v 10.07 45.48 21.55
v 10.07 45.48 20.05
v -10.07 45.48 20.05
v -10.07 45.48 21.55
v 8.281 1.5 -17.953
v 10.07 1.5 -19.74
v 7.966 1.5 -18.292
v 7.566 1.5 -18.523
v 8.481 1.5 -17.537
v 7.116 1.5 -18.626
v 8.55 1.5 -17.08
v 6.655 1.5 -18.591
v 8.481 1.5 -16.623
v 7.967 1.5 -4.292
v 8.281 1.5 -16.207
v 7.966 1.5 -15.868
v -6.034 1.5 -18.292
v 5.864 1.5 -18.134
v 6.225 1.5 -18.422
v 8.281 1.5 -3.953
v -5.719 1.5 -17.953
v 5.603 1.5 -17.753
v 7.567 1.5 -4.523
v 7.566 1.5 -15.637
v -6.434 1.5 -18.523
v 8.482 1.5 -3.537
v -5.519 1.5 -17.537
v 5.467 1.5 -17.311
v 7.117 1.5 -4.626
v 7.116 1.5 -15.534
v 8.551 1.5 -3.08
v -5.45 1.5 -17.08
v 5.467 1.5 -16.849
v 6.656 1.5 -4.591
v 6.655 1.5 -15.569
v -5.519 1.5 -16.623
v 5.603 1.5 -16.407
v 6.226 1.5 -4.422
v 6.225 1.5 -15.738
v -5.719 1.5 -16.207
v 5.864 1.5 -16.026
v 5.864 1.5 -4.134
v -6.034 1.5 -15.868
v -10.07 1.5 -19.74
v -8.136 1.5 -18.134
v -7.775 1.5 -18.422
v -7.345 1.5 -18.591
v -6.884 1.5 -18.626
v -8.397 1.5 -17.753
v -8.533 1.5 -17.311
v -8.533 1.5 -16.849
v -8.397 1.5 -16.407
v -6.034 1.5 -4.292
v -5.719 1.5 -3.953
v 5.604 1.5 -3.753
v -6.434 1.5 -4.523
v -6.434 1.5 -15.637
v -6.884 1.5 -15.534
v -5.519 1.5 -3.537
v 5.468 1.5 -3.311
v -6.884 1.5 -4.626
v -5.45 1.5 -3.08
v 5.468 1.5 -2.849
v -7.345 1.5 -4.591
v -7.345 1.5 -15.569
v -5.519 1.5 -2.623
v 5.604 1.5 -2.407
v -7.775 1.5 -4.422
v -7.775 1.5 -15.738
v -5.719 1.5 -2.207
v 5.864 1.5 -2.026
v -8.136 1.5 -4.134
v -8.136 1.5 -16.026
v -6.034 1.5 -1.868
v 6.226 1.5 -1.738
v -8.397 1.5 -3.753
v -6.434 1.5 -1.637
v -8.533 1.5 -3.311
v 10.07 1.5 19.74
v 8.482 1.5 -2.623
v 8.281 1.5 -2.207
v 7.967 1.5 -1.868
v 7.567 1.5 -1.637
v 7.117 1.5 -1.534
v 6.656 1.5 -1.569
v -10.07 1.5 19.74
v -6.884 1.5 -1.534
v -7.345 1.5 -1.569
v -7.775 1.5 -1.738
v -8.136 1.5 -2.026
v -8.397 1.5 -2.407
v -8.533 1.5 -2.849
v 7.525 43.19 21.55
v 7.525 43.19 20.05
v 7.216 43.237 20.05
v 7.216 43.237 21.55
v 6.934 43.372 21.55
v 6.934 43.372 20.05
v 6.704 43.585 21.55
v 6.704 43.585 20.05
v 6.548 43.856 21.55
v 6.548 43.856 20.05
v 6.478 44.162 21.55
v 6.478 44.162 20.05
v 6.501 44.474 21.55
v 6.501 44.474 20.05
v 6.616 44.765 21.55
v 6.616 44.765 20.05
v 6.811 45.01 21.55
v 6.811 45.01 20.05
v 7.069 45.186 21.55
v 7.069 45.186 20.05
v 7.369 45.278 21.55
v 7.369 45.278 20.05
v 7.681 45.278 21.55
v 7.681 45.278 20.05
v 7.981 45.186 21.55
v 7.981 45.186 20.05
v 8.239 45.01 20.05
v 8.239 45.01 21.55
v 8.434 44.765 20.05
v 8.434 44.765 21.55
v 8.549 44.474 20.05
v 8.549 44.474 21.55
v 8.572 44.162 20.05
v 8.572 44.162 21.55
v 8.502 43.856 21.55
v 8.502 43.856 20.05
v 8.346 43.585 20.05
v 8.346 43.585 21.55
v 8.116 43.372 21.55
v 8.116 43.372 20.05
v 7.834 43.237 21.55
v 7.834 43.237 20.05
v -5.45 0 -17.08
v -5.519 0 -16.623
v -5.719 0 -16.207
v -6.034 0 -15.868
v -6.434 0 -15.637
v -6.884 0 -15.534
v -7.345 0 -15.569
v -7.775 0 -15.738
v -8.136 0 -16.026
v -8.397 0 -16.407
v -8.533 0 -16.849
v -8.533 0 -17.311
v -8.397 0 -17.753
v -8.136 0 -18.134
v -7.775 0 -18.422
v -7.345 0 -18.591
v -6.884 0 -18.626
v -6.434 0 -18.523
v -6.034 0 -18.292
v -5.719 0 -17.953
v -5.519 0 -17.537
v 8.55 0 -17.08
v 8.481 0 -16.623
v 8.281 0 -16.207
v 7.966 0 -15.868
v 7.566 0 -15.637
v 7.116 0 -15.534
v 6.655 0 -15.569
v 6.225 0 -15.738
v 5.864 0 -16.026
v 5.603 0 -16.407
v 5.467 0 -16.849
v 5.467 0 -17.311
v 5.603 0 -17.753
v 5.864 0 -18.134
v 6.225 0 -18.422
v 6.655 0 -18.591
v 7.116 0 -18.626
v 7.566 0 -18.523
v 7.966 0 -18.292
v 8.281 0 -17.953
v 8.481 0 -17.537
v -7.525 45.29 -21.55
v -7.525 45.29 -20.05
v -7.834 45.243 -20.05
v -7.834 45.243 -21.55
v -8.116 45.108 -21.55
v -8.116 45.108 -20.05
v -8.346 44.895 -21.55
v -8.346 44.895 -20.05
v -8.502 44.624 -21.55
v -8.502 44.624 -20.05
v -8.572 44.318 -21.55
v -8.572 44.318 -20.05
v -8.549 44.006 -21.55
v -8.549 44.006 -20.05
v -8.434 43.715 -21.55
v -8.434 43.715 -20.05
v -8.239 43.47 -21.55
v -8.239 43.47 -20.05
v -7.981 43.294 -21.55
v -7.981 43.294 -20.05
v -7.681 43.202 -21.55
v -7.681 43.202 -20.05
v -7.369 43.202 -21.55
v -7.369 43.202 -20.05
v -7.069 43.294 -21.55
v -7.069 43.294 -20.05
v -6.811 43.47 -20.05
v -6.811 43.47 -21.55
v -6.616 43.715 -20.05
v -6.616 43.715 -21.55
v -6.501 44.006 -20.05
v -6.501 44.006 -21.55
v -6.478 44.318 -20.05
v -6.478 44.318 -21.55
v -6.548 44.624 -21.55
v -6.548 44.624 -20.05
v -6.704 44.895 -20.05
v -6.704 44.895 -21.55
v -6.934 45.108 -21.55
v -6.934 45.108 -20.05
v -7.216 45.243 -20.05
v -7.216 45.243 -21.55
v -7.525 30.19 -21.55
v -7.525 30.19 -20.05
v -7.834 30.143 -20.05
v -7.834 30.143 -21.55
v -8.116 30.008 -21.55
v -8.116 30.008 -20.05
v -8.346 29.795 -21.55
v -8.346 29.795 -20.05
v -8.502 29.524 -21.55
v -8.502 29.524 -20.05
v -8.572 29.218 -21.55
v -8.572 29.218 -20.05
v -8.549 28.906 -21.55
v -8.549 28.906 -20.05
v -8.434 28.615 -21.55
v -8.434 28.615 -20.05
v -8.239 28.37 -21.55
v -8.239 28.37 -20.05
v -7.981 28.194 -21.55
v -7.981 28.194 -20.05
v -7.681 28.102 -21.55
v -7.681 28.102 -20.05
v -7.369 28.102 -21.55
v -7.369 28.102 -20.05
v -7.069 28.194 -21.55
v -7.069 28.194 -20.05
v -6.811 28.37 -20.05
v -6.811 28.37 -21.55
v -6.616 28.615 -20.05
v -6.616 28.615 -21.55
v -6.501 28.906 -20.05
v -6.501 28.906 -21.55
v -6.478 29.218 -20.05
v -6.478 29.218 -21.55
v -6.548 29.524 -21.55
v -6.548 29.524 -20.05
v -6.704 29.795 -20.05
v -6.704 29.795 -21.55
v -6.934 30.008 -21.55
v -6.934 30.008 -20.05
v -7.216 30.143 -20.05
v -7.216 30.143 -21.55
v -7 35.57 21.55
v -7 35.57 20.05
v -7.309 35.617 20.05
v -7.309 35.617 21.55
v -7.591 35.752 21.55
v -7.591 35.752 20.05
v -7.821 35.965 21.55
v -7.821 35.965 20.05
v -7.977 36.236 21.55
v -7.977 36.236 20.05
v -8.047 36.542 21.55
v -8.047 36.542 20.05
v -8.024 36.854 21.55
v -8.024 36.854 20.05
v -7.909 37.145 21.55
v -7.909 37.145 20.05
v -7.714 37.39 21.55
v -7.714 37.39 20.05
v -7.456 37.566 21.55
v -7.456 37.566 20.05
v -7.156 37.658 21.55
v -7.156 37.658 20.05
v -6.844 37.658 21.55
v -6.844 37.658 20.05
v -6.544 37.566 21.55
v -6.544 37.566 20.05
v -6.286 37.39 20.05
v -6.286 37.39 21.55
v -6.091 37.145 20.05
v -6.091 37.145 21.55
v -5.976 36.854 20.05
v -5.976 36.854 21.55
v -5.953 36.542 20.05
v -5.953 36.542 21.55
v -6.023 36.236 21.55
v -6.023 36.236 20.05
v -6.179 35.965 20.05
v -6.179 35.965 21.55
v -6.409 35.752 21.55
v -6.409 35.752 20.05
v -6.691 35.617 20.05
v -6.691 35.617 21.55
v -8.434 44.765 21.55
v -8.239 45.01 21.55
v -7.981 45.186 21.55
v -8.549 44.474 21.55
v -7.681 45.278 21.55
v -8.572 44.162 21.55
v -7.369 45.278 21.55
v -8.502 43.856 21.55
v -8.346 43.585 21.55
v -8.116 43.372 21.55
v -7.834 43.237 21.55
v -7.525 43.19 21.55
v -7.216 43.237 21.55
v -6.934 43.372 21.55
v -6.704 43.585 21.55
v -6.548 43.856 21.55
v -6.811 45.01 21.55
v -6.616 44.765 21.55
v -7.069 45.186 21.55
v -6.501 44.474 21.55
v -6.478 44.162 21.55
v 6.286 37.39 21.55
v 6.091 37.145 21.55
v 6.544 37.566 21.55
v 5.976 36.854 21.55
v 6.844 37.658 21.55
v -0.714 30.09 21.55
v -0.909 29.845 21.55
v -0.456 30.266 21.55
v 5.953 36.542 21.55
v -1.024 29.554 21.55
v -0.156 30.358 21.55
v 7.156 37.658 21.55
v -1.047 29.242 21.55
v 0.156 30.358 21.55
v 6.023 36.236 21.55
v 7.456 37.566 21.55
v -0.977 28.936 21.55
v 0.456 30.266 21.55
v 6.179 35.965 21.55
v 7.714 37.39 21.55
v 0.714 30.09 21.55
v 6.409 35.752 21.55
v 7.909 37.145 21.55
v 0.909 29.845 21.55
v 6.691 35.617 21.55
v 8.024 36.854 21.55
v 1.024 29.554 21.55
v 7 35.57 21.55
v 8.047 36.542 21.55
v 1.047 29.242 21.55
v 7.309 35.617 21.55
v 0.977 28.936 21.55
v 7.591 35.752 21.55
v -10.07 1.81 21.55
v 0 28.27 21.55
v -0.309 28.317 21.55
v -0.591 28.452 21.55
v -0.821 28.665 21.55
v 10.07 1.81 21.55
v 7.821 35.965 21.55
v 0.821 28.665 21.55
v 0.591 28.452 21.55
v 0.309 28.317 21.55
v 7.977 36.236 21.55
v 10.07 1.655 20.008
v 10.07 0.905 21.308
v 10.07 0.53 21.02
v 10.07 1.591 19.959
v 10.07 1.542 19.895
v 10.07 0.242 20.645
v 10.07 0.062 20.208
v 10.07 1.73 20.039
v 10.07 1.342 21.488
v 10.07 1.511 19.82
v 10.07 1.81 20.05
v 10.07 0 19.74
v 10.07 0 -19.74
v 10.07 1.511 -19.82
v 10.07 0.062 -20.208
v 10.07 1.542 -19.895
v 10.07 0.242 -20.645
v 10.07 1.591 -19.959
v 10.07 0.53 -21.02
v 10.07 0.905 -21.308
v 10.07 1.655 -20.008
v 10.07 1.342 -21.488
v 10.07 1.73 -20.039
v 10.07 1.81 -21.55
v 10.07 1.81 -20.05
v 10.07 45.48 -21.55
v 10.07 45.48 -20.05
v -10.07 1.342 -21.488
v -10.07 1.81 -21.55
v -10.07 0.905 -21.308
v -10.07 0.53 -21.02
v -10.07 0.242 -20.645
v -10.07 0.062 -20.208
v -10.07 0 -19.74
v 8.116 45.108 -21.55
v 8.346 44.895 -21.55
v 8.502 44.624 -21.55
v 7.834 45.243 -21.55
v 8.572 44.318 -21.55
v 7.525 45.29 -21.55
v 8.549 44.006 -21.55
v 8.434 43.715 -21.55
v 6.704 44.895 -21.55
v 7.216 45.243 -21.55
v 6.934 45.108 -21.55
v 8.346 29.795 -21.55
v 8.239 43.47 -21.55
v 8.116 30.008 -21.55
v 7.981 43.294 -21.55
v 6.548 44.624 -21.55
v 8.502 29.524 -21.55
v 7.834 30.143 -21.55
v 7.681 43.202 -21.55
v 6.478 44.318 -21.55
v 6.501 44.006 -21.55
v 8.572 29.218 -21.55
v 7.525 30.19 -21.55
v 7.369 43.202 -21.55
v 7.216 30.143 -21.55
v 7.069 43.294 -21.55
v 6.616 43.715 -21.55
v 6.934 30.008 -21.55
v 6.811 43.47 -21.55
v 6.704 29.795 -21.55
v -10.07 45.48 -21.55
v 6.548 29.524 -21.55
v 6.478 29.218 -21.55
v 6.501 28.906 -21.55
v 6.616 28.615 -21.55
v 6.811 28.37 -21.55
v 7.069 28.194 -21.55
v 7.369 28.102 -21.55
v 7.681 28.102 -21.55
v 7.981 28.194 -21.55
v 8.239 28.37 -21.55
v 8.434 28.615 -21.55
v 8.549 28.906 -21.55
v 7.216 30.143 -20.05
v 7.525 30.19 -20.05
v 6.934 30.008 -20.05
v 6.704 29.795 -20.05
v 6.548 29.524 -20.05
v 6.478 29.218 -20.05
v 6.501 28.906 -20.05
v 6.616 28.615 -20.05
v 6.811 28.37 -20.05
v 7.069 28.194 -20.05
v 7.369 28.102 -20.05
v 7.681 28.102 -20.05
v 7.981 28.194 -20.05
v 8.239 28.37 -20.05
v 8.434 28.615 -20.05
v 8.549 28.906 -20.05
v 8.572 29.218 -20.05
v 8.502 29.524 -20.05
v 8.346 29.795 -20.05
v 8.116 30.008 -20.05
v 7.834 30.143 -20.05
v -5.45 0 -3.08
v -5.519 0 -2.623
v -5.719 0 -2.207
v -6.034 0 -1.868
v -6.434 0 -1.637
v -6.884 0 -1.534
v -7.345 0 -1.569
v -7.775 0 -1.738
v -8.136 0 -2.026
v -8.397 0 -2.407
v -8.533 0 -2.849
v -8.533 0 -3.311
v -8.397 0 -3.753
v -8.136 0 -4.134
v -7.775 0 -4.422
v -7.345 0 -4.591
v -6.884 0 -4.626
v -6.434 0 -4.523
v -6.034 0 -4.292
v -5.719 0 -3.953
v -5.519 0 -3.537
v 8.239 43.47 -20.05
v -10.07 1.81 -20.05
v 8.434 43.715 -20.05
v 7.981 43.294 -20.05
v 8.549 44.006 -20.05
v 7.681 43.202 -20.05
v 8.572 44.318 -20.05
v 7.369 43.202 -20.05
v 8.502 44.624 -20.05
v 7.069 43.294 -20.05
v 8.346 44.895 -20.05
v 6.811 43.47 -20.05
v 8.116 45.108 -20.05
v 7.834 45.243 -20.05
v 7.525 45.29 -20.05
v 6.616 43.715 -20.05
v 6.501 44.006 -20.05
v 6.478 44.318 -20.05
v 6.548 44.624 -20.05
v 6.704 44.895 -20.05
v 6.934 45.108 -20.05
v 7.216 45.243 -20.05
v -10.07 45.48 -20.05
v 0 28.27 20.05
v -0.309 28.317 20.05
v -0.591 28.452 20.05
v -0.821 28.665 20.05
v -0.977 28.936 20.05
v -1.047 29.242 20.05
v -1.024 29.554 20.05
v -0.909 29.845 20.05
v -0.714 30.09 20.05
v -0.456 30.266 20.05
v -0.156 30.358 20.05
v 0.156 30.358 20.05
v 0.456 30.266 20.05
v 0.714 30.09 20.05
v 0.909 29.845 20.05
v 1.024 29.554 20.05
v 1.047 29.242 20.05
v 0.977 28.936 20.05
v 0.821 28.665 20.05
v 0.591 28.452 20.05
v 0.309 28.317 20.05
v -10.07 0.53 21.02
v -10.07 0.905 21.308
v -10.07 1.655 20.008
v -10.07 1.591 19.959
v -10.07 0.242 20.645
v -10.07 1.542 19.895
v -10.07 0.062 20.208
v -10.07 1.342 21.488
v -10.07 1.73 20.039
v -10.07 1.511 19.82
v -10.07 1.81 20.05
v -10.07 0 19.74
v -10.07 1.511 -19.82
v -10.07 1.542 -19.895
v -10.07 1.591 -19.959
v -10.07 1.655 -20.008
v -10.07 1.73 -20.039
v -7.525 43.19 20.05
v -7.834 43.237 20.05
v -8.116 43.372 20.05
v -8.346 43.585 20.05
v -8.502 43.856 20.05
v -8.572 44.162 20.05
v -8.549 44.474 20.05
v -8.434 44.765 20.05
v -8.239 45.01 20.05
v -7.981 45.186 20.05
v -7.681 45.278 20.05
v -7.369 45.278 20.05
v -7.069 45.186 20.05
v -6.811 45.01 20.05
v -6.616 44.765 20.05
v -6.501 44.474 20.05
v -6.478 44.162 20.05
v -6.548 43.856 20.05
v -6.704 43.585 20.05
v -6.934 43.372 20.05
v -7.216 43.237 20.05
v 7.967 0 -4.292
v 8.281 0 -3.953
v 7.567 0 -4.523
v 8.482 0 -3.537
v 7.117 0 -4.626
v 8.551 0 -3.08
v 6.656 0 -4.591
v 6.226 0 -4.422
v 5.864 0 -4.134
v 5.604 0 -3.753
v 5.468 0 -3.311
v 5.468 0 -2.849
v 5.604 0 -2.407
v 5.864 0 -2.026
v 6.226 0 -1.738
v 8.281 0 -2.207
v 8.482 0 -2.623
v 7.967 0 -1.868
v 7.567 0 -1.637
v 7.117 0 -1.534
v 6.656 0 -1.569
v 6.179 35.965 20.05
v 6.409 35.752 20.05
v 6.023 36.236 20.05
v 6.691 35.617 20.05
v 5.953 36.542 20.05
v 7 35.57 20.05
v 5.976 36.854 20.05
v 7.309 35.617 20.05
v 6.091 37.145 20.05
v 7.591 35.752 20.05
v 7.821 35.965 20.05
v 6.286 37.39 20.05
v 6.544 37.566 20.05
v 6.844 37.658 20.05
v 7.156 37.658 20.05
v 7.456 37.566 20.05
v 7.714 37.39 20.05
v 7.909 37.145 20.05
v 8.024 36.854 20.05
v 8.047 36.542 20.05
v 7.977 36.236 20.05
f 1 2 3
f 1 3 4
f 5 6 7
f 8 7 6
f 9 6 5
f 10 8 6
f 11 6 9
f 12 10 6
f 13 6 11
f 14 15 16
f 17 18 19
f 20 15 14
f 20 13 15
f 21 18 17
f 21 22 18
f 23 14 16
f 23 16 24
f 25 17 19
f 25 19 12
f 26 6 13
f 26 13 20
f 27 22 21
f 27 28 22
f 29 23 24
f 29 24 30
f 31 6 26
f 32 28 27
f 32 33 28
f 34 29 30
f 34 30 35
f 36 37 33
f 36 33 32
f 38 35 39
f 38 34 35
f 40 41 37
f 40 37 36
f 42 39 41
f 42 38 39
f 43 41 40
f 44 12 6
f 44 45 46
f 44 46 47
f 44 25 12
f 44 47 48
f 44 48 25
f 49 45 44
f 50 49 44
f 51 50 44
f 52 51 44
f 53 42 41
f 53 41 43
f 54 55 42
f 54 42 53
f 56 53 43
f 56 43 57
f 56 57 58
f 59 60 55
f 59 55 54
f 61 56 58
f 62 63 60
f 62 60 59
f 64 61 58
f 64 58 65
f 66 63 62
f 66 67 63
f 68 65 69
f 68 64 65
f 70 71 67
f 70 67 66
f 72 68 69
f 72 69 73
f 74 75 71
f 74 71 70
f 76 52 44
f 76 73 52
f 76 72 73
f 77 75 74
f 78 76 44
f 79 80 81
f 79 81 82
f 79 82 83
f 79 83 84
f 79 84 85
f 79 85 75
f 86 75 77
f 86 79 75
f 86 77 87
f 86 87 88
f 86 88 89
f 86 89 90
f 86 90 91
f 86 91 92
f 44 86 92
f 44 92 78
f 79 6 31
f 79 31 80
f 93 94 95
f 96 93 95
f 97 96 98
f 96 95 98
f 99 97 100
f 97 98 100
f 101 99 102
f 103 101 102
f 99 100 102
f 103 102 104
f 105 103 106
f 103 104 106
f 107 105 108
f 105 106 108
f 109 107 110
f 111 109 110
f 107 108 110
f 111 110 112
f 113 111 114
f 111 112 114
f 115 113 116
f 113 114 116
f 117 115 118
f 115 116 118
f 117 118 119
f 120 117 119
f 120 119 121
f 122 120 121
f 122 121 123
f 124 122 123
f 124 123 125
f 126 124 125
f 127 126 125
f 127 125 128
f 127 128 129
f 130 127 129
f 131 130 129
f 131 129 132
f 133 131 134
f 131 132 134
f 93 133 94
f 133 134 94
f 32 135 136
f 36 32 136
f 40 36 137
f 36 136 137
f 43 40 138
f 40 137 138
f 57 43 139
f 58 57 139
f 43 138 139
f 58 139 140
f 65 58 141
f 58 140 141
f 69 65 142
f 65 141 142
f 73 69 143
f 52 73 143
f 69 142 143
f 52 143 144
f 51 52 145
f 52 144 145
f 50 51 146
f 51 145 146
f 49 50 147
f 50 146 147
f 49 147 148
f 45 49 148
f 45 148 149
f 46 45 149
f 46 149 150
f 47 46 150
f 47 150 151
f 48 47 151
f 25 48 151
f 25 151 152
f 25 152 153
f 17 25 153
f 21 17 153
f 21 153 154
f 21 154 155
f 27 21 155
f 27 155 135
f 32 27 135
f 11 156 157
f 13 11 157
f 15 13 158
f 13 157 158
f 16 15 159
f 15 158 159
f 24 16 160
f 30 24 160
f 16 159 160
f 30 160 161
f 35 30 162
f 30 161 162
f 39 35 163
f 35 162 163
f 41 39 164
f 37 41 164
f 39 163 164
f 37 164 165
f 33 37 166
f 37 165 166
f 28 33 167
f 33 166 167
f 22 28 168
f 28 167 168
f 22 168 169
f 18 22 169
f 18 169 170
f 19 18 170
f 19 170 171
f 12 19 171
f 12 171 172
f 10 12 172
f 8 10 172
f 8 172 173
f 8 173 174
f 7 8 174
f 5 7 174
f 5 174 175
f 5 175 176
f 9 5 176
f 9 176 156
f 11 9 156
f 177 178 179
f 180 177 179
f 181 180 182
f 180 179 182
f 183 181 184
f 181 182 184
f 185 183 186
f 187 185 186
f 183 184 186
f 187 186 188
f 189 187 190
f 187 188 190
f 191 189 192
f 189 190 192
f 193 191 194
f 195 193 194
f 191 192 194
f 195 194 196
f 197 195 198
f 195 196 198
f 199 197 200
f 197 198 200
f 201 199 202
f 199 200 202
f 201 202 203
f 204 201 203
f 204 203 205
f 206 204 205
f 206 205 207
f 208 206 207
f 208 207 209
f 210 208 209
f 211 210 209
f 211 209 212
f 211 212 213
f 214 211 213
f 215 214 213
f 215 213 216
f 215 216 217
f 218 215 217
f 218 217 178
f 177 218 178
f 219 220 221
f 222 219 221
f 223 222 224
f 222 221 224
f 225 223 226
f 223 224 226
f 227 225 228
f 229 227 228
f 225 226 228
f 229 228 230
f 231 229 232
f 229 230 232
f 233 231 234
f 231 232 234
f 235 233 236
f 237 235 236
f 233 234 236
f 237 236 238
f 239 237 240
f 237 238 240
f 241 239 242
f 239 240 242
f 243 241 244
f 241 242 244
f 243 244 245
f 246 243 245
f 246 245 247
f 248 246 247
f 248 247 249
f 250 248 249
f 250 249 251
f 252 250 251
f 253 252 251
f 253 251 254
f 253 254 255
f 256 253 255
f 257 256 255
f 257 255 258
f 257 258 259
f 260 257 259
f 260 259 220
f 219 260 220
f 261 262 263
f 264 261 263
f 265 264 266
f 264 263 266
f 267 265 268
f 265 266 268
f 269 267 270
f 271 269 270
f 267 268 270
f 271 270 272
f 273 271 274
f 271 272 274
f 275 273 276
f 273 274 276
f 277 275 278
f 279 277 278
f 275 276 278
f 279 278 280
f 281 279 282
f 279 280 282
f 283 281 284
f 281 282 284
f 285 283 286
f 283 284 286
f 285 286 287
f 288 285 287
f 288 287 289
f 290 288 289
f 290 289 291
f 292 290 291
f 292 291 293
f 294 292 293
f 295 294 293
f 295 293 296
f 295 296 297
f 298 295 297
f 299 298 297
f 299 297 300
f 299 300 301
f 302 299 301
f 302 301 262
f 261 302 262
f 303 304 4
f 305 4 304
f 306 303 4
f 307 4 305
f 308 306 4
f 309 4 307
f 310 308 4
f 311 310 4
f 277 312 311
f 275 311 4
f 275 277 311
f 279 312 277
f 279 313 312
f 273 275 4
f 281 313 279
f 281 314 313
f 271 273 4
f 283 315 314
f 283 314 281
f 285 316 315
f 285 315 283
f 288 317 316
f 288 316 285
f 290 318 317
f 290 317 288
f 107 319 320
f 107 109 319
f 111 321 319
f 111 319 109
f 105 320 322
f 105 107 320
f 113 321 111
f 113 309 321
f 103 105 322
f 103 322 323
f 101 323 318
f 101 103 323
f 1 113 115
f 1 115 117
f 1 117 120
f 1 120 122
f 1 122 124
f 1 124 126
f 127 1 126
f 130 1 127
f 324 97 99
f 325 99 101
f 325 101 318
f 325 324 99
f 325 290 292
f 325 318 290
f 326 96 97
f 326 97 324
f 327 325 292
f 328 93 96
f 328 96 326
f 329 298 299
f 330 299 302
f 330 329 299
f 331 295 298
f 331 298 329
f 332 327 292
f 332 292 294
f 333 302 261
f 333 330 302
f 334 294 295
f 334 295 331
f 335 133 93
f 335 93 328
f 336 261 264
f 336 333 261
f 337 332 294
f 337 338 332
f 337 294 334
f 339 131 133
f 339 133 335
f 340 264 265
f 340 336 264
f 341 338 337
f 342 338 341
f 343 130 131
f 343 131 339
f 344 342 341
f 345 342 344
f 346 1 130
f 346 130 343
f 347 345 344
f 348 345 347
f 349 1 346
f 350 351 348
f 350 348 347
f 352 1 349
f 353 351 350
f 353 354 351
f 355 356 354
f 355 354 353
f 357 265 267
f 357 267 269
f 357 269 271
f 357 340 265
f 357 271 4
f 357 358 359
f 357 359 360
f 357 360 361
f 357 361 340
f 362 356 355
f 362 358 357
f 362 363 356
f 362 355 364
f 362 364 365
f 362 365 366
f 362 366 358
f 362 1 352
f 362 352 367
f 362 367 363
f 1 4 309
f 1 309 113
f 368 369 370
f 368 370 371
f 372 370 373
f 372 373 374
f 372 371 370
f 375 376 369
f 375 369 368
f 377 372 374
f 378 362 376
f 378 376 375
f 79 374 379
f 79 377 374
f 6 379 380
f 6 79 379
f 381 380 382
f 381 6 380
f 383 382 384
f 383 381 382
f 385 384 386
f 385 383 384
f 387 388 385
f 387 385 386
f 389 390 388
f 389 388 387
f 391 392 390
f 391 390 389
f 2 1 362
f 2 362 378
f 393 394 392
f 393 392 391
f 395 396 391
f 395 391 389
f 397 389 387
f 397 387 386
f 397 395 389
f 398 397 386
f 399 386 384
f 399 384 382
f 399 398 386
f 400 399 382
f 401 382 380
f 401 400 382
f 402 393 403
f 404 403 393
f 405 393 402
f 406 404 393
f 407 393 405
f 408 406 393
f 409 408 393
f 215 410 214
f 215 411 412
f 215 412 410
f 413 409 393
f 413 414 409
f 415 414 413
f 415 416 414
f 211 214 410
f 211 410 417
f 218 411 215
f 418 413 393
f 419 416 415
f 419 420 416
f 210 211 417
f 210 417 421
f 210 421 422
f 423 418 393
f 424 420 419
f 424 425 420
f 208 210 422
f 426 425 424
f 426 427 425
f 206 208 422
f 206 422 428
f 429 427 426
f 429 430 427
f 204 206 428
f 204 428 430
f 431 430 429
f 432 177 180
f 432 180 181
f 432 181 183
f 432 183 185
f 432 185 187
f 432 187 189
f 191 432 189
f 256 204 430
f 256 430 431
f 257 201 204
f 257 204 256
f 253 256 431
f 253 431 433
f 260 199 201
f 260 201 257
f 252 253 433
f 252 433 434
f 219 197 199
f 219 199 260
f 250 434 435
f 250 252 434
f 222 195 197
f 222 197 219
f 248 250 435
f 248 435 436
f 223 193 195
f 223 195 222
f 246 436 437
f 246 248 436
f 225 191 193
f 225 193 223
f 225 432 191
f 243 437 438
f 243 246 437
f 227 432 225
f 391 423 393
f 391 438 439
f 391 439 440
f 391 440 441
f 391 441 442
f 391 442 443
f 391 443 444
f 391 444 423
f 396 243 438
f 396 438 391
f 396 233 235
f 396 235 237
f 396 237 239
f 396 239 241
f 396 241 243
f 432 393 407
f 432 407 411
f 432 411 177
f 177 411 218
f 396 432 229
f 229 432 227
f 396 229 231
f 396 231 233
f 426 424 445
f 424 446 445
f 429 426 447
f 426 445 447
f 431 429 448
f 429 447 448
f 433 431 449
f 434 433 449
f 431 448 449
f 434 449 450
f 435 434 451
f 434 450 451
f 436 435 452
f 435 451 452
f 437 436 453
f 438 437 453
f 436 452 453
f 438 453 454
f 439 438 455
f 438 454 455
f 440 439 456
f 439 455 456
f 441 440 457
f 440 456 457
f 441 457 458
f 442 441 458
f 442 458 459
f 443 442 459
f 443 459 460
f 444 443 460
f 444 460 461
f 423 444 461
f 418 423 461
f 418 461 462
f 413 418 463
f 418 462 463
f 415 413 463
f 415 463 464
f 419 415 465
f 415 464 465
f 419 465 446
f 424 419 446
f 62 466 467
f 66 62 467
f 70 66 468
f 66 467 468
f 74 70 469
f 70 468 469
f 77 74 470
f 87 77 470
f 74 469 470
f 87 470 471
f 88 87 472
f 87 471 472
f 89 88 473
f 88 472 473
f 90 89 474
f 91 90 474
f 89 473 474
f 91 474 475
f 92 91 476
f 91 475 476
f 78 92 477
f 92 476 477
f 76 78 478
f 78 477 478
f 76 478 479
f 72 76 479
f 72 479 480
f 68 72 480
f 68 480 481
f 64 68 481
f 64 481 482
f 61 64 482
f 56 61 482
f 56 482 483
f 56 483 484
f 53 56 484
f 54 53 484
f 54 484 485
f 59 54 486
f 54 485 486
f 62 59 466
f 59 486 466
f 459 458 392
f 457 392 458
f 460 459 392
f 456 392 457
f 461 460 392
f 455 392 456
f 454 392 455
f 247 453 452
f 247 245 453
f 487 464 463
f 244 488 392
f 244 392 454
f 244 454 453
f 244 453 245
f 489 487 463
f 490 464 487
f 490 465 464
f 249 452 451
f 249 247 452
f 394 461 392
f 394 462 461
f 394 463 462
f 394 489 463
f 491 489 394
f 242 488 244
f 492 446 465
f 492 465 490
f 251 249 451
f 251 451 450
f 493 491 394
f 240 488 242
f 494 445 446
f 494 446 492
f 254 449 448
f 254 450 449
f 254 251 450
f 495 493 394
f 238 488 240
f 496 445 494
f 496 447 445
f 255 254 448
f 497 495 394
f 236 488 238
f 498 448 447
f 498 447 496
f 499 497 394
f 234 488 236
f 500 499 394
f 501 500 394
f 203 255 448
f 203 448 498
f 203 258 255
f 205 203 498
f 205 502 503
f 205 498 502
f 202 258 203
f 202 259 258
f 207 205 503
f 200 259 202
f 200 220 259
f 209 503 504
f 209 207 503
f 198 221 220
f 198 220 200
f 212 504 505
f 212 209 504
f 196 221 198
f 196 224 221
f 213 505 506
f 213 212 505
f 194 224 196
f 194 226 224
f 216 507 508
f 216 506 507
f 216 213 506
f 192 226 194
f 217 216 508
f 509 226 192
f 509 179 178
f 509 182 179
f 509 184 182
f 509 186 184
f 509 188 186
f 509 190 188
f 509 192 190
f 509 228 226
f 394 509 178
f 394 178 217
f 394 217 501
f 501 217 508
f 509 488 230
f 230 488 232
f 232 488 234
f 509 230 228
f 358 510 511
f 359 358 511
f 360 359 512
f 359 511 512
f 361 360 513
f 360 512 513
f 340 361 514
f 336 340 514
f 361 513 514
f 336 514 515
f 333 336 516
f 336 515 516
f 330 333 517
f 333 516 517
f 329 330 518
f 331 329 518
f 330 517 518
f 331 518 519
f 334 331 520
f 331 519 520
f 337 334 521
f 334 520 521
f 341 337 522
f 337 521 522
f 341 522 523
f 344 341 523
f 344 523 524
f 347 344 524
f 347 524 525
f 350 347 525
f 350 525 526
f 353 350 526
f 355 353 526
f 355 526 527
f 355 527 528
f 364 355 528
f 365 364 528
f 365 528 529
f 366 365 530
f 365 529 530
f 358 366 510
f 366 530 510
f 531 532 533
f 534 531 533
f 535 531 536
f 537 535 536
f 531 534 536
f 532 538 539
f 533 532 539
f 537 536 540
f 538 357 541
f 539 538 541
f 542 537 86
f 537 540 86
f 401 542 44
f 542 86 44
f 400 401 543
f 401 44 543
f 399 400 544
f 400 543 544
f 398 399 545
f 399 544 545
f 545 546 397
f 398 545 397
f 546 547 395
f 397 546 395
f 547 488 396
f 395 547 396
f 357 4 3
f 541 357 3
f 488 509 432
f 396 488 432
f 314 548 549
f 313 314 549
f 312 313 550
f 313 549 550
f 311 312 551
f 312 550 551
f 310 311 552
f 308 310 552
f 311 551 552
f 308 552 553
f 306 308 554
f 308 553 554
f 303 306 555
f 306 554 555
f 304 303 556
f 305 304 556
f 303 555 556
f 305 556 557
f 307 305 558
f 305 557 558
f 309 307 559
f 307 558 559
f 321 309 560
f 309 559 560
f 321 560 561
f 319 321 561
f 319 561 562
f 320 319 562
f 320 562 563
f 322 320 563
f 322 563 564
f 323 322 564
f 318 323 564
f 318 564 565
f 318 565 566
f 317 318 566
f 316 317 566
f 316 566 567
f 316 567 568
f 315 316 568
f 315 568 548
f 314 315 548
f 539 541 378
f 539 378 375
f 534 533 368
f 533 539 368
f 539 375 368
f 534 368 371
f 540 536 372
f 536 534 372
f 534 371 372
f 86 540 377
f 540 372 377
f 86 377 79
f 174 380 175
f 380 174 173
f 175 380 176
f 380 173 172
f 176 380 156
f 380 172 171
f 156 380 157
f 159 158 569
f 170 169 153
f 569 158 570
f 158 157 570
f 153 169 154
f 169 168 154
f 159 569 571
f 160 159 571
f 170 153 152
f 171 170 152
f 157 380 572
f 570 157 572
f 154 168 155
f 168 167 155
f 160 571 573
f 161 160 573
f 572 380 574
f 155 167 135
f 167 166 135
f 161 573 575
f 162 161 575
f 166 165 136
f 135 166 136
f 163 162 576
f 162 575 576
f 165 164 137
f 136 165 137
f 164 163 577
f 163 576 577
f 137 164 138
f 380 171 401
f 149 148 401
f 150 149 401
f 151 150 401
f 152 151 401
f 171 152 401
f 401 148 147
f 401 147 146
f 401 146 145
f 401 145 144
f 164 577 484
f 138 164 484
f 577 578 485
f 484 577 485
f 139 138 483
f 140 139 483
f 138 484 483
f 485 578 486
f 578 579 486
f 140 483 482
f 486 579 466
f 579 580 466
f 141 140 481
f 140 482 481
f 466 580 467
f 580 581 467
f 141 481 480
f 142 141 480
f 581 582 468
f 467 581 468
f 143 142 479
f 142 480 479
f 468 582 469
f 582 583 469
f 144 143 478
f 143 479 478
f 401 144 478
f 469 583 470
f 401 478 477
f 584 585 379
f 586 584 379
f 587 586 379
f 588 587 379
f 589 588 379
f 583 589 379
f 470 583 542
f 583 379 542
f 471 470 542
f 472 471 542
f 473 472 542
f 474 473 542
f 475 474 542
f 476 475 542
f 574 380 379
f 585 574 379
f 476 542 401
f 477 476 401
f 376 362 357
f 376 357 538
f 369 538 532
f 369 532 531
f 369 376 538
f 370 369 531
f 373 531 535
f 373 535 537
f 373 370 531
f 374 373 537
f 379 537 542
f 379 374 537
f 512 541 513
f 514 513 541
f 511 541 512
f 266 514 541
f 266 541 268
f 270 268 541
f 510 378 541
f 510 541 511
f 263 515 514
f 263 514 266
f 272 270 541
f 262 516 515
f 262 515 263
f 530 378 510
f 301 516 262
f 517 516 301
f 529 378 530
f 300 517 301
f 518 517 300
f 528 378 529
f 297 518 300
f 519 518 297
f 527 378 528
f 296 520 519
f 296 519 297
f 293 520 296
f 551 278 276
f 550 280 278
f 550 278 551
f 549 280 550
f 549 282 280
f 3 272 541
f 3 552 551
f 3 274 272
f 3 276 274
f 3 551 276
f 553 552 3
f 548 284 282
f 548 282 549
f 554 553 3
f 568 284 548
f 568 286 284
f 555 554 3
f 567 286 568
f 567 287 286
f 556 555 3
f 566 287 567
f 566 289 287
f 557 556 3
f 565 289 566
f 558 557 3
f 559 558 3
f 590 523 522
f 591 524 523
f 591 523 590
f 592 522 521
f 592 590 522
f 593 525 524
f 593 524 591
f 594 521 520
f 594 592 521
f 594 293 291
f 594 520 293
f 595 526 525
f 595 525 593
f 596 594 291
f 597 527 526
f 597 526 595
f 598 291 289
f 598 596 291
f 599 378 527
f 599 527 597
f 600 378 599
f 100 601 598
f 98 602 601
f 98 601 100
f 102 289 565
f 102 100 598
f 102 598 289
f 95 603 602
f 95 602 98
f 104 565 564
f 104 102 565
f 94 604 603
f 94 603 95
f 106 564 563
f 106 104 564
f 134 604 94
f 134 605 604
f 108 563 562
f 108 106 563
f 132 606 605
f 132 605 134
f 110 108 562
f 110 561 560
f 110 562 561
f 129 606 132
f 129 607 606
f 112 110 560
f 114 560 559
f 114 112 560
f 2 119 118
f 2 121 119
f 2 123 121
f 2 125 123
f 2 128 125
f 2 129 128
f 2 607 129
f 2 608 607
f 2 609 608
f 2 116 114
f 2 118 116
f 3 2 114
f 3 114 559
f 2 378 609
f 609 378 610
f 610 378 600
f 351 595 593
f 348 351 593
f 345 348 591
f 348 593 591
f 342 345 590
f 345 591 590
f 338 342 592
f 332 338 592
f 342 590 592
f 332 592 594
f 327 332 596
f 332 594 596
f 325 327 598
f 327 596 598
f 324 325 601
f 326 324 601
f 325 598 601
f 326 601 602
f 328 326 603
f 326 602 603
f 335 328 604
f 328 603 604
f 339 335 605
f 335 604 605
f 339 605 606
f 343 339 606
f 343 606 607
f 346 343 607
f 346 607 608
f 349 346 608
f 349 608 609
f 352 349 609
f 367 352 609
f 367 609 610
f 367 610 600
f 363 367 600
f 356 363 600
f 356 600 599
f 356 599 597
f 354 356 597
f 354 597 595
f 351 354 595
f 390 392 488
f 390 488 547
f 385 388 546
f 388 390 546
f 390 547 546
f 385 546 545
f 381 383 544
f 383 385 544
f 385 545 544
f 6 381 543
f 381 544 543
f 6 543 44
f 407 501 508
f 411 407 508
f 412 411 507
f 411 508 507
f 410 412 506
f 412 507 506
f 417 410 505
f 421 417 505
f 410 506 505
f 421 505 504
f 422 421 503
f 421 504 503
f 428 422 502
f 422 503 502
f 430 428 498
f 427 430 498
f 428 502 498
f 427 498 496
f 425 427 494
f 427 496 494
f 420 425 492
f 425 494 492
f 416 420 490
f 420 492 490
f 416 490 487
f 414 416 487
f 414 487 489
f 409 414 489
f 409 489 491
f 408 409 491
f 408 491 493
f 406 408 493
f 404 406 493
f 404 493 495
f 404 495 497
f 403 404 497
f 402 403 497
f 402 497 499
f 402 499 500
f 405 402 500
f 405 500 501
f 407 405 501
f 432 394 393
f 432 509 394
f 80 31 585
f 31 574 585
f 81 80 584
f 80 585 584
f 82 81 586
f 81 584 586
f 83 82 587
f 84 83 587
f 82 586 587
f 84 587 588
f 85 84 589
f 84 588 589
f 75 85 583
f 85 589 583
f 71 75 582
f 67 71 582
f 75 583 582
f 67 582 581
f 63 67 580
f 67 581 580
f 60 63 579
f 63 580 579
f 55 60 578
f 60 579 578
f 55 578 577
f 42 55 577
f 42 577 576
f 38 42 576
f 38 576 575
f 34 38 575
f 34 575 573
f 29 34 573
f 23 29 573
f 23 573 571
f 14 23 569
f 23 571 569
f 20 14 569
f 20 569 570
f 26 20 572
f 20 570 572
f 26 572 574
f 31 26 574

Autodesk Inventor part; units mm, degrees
ref_plane "YZ Plane" through (0, 0, 0) normal (1, 0, 0) x (0, 1, 0)
ref_plane "XZ Plane" through (0, 0, 0) normal (0, 1, 0) x (-1, 0, 0)
ref_plane "XY Plane" through (0, 0, 0) normal (0, 0, 1) x (1, 0, 0)
sketch "Sketch1" plane through (0, 0, 0) normal (0, 1, 0) x (-1, 0, 0)
  line L0 (10.07, 20.05) -> (-10.07, 20.05)
  line L1 (-10.07, 20.05) -> (-10.07, -20.05)
  line L2 (-10.07, -20.05) -> (10.07, -20.05)
  line L3 (10.07, -20.05) -> (10.07, 20.05)
  point P0 (0, 0)
  dimension "d0" = 40.1
  dimension "d1" = 20.14
  dimension "d2" = 10.07
  dimension "d3" = 20.05
extrude "Plate1" add sketch "Sketch1" along normal blind 1.5
sketch "Sketch2" plane through (10.07, 0, 21.55) normal (0, 0, -1) x (-1, 0, 0)
  line L0 (20.14, 0) -> (0, 0)
  line L1 (0, 0) -> (0, 45.48)
  line L2 (0, 45.48) -> (20.14, 45.48)
  line L3 (20.14, 45.48) -> (20.14, 0)
edge flange "Flange1" height 45.48 angle 90 thickness 1.5 bend radius 0.31 thickness toward (0, 0, -1) relief tear relief width 1.5 relief depth 0.75 corner gap 0.31 corner form 0 edges at (0, 1.5, 20.05) (0, 1.5, -20.05) wall of the first edge with corners at (-10.07, 0, 21.55) (10.07, 0, 21.55) (10.07, 45.48, 21.55) (-10.07, 45.48, 21.55)
bend "Bend1"
corner "Corner1"
sketch "Sketch3" plane through (10.07, 45.48, -21.55) normal (0, 0, -1) x (-1, 0, 0)
  circle A0 centre (17.595, -1.24) radius 0.7835 projected
  circle A1 centre (2.545, -1.24) radius 0.7835 projected
  circle A2 centre (2.545, -16.34) radius 0.7835 projected
  circle A3 centre (17.595, -16.34) radius 0.7835 projected
  point P0 (10.07, -45.48)
hole "Hole1" at (7.525, 44.24, -21.55) at (-7.525, 44.24, -21.55) at (-7.525, 29.14, -21.55) at (7.525, 29.14, -21.55) direction (0, 0, 1) diameter 2.1 depth 1.5
sketch "Sketch4" plane through (-10.07, 45.48, 21.55) normal (0, 0, 1) x (1, 0, 0)
  circle A0 centre (2.545, -1.24) radius 0.7835 projected
  circle A1 centre (17.595, -1.24) radius 0.7835 projected
  circle A2 centre (3.07, -8.86) radius 0.7835 projected
  circle A3 centre (17.07, -8.86) radius 0.7835 projected
  point P0 (10.07, -45.48)
sketch "Sketch5" plane through (-10.07, 45.48, 21.55) normal (0, 0, 1) x (1, 0, 0)
  circle A0 centre (10.07, -16.16) radius 0.7835 projected
  point P0 (10.07, -45.48)
hole "Hole2" at (-7.525, 44.24, 21.55) at (7.525, 44.24, 21.55) at (-7, 36.62, 21.55) at (7, 36.62, 21.55) direction (0, 0, -1) diameter 2.1 depth 1.5
hole "Hole3" at (0, 29.32, 21.55) direction (0, 0, -1) diameter 2.1 depth 1.5
sketch "Sketch6" plane through (0, 0, 0) normal (0, -1, 0) x (1, 0, 0)
  circle A0 centre (7.0007, -3.08) radius 1.55
  circle A1 centre (7, -17.08) radius 1.55
  circle A2 centre (-7, -17.08) radius 1.55
  circle A3 centre (-7, -3.08) radius 1.55
  point P0 (0, 0)
extrude "Cut1" cut sketch "Sketch6" against normal blind 1.5
equation "\"d20\" = Thickness"
equation "\"d27\" = Thickness"
equation "\"d34\" = Thickness"
equation "\"d36\" = Thickness"
equation "\"d4\" = Thickness"
equation "\"d5\" = BendReliefWidth"
equation "\"d6\" = BendReliefDepth"
equation "\"d7\" = MinimumRemnant"
equation "\"d8\" = TransitionRadius"
equation "\"d11\" = BendRadius"
equation "\"d12\" = CornerReliefSize"
equation "\"d13\" = GapSize"
equation "\"d14\" = JacobiRadiusSize"
equation "\"BendReliefWidth\" = Thickness"
equation "\"BendReliefDepth\" = 0.5 * Thickness"
equation "\"CornerReliefSize\" = 4 * Thickness"
equation "\"MinimumRemnant\" = 2 * Thickness"
equation "\"TransitionRadius\" = BendRadius"
equation "\"JacobiRadiusSize\" = BendRadius"
equation "\"GapSize\" = Thickness"
equation "\"Thickness\" = 1.5"
equation "\"BendRadius\" = 0.31"
properties part number "axis_25_top_frame" material "Aluminum 6061-AHC"
